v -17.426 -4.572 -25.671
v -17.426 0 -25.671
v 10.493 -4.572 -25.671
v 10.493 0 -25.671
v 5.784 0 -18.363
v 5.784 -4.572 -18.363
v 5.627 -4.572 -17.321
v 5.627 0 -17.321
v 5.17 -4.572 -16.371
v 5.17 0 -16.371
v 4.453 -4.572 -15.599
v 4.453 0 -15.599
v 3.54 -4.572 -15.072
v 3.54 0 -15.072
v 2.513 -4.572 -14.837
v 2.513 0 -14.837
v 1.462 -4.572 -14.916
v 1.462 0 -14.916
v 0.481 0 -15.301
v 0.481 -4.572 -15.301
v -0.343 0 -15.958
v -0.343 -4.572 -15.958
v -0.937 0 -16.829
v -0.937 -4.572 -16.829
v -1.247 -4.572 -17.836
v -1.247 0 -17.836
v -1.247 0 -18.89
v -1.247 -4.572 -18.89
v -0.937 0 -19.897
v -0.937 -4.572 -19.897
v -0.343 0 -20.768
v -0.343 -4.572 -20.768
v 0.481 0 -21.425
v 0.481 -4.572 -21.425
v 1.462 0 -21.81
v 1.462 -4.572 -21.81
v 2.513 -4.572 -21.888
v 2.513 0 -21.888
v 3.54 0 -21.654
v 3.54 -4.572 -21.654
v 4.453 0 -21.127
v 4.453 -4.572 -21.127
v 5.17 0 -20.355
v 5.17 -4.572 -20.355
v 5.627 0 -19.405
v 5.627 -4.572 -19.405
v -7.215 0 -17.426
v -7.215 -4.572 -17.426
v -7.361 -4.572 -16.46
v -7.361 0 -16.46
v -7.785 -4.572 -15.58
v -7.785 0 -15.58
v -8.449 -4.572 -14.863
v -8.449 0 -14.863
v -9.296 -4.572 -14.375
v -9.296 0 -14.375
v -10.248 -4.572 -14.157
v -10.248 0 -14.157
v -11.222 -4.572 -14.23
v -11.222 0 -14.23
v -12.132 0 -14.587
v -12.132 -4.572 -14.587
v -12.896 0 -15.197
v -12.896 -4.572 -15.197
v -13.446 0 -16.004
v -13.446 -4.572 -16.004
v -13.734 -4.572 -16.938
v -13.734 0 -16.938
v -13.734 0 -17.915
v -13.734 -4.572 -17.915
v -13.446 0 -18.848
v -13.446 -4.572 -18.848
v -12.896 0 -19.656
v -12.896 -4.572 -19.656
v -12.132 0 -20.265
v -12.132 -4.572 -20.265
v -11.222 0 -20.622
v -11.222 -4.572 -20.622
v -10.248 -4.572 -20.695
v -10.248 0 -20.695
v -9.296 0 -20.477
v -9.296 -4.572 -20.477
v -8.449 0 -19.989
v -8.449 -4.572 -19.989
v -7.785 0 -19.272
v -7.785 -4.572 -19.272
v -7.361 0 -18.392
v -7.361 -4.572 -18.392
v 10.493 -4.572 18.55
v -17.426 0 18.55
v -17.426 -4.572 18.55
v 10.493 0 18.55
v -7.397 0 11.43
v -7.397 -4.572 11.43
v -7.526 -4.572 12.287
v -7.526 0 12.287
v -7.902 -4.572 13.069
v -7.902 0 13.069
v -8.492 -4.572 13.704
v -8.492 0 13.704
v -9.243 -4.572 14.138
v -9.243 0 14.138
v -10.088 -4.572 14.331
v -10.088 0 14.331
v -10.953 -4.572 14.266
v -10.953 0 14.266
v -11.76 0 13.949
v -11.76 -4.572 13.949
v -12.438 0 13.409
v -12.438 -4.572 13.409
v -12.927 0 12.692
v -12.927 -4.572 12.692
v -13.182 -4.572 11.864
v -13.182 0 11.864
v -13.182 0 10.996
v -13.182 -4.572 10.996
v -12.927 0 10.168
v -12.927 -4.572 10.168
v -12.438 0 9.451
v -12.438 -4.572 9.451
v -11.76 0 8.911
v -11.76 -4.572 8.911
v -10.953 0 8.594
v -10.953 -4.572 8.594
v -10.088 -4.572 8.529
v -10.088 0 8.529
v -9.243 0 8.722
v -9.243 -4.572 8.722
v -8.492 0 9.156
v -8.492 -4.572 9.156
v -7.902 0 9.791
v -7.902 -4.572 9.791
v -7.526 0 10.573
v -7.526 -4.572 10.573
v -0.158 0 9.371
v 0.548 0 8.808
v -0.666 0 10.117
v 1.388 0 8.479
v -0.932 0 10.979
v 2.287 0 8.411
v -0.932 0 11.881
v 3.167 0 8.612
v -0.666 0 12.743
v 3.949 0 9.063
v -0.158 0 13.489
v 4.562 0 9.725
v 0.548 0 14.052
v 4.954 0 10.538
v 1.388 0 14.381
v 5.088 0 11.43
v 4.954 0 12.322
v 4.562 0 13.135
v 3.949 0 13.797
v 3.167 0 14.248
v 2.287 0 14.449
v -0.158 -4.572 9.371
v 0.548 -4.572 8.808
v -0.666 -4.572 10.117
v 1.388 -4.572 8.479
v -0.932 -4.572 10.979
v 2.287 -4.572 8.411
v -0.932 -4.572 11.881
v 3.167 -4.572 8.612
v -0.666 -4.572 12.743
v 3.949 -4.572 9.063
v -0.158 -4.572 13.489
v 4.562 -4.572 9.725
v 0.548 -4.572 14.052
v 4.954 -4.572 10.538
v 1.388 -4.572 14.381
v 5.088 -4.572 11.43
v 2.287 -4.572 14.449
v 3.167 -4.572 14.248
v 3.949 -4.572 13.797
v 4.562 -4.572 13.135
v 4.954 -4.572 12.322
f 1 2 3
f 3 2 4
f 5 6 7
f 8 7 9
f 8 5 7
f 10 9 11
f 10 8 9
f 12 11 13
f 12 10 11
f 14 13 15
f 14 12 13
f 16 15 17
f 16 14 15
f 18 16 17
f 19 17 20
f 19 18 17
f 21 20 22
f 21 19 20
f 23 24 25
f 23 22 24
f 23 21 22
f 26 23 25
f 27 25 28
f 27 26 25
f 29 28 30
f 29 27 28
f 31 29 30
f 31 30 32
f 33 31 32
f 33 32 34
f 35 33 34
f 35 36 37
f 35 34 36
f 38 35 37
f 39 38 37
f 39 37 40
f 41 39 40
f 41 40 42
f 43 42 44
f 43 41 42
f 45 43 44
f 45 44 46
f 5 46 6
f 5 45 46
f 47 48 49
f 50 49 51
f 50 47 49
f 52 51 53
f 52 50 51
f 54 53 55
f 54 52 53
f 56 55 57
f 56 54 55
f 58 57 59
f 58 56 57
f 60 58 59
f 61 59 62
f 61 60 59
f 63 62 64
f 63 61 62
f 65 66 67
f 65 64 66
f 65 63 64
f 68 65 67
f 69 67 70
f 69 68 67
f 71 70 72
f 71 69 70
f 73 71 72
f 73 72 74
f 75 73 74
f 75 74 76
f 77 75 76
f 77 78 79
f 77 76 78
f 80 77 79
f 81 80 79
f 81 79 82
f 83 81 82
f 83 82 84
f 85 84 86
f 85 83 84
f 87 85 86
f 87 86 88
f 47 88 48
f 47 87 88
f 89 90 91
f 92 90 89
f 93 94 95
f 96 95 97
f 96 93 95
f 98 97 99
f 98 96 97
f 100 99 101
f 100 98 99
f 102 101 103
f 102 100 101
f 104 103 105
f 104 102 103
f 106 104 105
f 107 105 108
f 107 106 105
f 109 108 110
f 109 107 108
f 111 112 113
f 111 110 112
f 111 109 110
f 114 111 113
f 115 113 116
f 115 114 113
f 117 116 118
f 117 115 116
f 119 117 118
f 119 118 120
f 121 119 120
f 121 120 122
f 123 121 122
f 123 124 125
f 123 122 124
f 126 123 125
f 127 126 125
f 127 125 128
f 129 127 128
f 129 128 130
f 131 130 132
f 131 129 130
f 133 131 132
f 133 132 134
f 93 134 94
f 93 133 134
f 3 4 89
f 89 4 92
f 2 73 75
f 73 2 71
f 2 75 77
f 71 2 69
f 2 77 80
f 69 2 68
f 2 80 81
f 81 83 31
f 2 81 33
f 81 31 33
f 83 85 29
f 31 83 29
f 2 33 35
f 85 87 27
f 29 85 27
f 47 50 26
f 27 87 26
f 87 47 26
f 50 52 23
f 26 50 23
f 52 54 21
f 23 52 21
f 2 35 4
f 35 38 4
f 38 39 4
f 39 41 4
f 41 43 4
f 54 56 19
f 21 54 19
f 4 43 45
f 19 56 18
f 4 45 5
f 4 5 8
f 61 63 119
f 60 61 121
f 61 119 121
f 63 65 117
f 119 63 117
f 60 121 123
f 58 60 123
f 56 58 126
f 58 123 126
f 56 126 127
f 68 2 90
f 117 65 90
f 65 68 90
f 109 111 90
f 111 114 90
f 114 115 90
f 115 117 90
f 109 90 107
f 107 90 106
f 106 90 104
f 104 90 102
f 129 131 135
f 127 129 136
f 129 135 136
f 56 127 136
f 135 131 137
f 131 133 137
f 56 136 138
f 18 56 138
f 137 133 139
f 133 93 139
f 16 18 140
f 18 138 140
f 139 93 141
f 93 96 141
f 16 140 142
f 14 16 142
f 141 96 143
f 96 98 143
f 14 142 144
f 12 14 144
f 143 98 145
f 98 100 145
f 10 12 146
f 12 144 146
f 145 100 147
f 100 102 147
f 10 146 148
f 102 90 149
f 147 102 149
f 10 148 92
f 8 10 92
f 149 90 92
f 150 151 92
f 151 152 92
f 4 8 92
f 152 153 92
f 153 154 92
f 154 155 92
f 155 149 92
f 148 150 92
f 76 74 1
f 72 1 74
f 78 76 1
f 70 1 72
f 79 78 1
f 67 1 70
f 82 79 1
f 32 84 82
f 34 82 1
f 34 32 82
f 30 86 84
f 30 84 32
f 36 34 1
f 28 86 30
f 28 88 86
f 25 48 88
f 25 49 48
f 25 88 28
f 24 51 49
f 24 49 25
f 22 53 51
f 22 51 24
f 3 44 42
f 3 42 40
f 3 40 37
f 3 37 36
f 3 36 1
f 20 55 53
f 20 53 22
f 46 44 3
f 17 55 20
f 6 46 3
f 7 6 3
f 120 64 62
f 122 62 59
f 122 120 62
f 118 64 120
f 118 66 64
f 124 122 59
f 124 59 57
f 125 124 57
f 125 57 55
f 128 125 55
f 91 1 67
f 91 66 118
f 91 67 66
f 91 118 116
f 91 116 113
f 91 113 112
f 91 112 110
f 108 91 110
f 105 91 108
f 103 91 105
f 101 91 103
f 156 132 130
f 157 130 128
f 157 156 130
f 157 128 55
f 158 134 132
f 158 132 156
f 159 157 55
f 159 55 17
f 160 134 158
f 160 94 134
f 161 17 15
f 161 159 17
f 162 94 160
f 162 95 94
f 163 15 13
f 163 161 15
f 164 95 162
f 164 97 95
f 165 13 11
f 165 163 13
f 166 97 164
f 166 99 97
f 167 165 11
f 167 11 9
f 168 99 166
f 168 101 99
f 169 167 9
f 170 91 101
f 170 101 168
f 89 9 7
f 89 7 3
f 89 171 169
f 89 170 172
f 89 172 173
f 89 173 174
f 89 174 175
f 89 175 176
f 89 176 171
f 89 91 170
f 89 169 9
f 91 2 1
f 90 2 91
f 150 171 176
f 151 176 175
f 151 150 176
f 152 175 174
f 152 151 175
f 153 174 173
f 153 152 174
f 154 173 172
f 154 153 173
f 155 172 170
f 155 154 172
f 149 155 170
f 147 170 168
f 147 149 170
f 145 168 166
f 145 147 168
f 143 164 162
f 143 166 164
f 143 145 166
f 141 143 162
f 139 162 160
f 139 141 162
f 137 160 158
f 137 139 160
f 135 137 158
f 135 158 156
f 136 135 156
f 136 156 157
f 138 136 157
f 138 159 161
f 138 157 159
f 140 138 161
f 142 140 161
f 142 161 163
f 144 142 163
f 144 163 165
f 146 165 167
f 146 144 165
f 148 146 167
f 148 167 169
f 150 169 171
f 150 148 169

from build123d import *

# Parameters (mm, degrees)
F0_W     = 27.91918
F0_H     = 44.220986
F1_DEPTH = 4.572
F2_R     = 2.908875
F2_R_2   = 3.535422
F2_R_3   = 3.27776
F2_R_4   = 3.027169
F3_DEPTH = 25.4


with BuildPart() as f1:
    # F0 (on Front) → F1 (new body)
    with BuildSketch(Plane.XZ):
        with Locations((-3.466476, -3.560164)):
            Rectangle(F0_W, F0_H)
    extrude(amount=F1_DEPTH)

    # F2 (on Front) → F3 (cut)
    with BuildSketch(Plane.XZ):
        with Locations((-10.305738, 11.430001)):
            Circle(F2_R)
        with Locations((2.248525, -18.362951)):
            Circle(F2_R_2)
        with Locations((-10.493115, -17.426066)):
            Circle(F2_R_3)
        with Locations((2.061148, 11.430001)):
            Circle(F2_R_4)
    extrude(amount=F3_DEPTH, mode=Mode.SUBTRACT)


solid = f1.part
